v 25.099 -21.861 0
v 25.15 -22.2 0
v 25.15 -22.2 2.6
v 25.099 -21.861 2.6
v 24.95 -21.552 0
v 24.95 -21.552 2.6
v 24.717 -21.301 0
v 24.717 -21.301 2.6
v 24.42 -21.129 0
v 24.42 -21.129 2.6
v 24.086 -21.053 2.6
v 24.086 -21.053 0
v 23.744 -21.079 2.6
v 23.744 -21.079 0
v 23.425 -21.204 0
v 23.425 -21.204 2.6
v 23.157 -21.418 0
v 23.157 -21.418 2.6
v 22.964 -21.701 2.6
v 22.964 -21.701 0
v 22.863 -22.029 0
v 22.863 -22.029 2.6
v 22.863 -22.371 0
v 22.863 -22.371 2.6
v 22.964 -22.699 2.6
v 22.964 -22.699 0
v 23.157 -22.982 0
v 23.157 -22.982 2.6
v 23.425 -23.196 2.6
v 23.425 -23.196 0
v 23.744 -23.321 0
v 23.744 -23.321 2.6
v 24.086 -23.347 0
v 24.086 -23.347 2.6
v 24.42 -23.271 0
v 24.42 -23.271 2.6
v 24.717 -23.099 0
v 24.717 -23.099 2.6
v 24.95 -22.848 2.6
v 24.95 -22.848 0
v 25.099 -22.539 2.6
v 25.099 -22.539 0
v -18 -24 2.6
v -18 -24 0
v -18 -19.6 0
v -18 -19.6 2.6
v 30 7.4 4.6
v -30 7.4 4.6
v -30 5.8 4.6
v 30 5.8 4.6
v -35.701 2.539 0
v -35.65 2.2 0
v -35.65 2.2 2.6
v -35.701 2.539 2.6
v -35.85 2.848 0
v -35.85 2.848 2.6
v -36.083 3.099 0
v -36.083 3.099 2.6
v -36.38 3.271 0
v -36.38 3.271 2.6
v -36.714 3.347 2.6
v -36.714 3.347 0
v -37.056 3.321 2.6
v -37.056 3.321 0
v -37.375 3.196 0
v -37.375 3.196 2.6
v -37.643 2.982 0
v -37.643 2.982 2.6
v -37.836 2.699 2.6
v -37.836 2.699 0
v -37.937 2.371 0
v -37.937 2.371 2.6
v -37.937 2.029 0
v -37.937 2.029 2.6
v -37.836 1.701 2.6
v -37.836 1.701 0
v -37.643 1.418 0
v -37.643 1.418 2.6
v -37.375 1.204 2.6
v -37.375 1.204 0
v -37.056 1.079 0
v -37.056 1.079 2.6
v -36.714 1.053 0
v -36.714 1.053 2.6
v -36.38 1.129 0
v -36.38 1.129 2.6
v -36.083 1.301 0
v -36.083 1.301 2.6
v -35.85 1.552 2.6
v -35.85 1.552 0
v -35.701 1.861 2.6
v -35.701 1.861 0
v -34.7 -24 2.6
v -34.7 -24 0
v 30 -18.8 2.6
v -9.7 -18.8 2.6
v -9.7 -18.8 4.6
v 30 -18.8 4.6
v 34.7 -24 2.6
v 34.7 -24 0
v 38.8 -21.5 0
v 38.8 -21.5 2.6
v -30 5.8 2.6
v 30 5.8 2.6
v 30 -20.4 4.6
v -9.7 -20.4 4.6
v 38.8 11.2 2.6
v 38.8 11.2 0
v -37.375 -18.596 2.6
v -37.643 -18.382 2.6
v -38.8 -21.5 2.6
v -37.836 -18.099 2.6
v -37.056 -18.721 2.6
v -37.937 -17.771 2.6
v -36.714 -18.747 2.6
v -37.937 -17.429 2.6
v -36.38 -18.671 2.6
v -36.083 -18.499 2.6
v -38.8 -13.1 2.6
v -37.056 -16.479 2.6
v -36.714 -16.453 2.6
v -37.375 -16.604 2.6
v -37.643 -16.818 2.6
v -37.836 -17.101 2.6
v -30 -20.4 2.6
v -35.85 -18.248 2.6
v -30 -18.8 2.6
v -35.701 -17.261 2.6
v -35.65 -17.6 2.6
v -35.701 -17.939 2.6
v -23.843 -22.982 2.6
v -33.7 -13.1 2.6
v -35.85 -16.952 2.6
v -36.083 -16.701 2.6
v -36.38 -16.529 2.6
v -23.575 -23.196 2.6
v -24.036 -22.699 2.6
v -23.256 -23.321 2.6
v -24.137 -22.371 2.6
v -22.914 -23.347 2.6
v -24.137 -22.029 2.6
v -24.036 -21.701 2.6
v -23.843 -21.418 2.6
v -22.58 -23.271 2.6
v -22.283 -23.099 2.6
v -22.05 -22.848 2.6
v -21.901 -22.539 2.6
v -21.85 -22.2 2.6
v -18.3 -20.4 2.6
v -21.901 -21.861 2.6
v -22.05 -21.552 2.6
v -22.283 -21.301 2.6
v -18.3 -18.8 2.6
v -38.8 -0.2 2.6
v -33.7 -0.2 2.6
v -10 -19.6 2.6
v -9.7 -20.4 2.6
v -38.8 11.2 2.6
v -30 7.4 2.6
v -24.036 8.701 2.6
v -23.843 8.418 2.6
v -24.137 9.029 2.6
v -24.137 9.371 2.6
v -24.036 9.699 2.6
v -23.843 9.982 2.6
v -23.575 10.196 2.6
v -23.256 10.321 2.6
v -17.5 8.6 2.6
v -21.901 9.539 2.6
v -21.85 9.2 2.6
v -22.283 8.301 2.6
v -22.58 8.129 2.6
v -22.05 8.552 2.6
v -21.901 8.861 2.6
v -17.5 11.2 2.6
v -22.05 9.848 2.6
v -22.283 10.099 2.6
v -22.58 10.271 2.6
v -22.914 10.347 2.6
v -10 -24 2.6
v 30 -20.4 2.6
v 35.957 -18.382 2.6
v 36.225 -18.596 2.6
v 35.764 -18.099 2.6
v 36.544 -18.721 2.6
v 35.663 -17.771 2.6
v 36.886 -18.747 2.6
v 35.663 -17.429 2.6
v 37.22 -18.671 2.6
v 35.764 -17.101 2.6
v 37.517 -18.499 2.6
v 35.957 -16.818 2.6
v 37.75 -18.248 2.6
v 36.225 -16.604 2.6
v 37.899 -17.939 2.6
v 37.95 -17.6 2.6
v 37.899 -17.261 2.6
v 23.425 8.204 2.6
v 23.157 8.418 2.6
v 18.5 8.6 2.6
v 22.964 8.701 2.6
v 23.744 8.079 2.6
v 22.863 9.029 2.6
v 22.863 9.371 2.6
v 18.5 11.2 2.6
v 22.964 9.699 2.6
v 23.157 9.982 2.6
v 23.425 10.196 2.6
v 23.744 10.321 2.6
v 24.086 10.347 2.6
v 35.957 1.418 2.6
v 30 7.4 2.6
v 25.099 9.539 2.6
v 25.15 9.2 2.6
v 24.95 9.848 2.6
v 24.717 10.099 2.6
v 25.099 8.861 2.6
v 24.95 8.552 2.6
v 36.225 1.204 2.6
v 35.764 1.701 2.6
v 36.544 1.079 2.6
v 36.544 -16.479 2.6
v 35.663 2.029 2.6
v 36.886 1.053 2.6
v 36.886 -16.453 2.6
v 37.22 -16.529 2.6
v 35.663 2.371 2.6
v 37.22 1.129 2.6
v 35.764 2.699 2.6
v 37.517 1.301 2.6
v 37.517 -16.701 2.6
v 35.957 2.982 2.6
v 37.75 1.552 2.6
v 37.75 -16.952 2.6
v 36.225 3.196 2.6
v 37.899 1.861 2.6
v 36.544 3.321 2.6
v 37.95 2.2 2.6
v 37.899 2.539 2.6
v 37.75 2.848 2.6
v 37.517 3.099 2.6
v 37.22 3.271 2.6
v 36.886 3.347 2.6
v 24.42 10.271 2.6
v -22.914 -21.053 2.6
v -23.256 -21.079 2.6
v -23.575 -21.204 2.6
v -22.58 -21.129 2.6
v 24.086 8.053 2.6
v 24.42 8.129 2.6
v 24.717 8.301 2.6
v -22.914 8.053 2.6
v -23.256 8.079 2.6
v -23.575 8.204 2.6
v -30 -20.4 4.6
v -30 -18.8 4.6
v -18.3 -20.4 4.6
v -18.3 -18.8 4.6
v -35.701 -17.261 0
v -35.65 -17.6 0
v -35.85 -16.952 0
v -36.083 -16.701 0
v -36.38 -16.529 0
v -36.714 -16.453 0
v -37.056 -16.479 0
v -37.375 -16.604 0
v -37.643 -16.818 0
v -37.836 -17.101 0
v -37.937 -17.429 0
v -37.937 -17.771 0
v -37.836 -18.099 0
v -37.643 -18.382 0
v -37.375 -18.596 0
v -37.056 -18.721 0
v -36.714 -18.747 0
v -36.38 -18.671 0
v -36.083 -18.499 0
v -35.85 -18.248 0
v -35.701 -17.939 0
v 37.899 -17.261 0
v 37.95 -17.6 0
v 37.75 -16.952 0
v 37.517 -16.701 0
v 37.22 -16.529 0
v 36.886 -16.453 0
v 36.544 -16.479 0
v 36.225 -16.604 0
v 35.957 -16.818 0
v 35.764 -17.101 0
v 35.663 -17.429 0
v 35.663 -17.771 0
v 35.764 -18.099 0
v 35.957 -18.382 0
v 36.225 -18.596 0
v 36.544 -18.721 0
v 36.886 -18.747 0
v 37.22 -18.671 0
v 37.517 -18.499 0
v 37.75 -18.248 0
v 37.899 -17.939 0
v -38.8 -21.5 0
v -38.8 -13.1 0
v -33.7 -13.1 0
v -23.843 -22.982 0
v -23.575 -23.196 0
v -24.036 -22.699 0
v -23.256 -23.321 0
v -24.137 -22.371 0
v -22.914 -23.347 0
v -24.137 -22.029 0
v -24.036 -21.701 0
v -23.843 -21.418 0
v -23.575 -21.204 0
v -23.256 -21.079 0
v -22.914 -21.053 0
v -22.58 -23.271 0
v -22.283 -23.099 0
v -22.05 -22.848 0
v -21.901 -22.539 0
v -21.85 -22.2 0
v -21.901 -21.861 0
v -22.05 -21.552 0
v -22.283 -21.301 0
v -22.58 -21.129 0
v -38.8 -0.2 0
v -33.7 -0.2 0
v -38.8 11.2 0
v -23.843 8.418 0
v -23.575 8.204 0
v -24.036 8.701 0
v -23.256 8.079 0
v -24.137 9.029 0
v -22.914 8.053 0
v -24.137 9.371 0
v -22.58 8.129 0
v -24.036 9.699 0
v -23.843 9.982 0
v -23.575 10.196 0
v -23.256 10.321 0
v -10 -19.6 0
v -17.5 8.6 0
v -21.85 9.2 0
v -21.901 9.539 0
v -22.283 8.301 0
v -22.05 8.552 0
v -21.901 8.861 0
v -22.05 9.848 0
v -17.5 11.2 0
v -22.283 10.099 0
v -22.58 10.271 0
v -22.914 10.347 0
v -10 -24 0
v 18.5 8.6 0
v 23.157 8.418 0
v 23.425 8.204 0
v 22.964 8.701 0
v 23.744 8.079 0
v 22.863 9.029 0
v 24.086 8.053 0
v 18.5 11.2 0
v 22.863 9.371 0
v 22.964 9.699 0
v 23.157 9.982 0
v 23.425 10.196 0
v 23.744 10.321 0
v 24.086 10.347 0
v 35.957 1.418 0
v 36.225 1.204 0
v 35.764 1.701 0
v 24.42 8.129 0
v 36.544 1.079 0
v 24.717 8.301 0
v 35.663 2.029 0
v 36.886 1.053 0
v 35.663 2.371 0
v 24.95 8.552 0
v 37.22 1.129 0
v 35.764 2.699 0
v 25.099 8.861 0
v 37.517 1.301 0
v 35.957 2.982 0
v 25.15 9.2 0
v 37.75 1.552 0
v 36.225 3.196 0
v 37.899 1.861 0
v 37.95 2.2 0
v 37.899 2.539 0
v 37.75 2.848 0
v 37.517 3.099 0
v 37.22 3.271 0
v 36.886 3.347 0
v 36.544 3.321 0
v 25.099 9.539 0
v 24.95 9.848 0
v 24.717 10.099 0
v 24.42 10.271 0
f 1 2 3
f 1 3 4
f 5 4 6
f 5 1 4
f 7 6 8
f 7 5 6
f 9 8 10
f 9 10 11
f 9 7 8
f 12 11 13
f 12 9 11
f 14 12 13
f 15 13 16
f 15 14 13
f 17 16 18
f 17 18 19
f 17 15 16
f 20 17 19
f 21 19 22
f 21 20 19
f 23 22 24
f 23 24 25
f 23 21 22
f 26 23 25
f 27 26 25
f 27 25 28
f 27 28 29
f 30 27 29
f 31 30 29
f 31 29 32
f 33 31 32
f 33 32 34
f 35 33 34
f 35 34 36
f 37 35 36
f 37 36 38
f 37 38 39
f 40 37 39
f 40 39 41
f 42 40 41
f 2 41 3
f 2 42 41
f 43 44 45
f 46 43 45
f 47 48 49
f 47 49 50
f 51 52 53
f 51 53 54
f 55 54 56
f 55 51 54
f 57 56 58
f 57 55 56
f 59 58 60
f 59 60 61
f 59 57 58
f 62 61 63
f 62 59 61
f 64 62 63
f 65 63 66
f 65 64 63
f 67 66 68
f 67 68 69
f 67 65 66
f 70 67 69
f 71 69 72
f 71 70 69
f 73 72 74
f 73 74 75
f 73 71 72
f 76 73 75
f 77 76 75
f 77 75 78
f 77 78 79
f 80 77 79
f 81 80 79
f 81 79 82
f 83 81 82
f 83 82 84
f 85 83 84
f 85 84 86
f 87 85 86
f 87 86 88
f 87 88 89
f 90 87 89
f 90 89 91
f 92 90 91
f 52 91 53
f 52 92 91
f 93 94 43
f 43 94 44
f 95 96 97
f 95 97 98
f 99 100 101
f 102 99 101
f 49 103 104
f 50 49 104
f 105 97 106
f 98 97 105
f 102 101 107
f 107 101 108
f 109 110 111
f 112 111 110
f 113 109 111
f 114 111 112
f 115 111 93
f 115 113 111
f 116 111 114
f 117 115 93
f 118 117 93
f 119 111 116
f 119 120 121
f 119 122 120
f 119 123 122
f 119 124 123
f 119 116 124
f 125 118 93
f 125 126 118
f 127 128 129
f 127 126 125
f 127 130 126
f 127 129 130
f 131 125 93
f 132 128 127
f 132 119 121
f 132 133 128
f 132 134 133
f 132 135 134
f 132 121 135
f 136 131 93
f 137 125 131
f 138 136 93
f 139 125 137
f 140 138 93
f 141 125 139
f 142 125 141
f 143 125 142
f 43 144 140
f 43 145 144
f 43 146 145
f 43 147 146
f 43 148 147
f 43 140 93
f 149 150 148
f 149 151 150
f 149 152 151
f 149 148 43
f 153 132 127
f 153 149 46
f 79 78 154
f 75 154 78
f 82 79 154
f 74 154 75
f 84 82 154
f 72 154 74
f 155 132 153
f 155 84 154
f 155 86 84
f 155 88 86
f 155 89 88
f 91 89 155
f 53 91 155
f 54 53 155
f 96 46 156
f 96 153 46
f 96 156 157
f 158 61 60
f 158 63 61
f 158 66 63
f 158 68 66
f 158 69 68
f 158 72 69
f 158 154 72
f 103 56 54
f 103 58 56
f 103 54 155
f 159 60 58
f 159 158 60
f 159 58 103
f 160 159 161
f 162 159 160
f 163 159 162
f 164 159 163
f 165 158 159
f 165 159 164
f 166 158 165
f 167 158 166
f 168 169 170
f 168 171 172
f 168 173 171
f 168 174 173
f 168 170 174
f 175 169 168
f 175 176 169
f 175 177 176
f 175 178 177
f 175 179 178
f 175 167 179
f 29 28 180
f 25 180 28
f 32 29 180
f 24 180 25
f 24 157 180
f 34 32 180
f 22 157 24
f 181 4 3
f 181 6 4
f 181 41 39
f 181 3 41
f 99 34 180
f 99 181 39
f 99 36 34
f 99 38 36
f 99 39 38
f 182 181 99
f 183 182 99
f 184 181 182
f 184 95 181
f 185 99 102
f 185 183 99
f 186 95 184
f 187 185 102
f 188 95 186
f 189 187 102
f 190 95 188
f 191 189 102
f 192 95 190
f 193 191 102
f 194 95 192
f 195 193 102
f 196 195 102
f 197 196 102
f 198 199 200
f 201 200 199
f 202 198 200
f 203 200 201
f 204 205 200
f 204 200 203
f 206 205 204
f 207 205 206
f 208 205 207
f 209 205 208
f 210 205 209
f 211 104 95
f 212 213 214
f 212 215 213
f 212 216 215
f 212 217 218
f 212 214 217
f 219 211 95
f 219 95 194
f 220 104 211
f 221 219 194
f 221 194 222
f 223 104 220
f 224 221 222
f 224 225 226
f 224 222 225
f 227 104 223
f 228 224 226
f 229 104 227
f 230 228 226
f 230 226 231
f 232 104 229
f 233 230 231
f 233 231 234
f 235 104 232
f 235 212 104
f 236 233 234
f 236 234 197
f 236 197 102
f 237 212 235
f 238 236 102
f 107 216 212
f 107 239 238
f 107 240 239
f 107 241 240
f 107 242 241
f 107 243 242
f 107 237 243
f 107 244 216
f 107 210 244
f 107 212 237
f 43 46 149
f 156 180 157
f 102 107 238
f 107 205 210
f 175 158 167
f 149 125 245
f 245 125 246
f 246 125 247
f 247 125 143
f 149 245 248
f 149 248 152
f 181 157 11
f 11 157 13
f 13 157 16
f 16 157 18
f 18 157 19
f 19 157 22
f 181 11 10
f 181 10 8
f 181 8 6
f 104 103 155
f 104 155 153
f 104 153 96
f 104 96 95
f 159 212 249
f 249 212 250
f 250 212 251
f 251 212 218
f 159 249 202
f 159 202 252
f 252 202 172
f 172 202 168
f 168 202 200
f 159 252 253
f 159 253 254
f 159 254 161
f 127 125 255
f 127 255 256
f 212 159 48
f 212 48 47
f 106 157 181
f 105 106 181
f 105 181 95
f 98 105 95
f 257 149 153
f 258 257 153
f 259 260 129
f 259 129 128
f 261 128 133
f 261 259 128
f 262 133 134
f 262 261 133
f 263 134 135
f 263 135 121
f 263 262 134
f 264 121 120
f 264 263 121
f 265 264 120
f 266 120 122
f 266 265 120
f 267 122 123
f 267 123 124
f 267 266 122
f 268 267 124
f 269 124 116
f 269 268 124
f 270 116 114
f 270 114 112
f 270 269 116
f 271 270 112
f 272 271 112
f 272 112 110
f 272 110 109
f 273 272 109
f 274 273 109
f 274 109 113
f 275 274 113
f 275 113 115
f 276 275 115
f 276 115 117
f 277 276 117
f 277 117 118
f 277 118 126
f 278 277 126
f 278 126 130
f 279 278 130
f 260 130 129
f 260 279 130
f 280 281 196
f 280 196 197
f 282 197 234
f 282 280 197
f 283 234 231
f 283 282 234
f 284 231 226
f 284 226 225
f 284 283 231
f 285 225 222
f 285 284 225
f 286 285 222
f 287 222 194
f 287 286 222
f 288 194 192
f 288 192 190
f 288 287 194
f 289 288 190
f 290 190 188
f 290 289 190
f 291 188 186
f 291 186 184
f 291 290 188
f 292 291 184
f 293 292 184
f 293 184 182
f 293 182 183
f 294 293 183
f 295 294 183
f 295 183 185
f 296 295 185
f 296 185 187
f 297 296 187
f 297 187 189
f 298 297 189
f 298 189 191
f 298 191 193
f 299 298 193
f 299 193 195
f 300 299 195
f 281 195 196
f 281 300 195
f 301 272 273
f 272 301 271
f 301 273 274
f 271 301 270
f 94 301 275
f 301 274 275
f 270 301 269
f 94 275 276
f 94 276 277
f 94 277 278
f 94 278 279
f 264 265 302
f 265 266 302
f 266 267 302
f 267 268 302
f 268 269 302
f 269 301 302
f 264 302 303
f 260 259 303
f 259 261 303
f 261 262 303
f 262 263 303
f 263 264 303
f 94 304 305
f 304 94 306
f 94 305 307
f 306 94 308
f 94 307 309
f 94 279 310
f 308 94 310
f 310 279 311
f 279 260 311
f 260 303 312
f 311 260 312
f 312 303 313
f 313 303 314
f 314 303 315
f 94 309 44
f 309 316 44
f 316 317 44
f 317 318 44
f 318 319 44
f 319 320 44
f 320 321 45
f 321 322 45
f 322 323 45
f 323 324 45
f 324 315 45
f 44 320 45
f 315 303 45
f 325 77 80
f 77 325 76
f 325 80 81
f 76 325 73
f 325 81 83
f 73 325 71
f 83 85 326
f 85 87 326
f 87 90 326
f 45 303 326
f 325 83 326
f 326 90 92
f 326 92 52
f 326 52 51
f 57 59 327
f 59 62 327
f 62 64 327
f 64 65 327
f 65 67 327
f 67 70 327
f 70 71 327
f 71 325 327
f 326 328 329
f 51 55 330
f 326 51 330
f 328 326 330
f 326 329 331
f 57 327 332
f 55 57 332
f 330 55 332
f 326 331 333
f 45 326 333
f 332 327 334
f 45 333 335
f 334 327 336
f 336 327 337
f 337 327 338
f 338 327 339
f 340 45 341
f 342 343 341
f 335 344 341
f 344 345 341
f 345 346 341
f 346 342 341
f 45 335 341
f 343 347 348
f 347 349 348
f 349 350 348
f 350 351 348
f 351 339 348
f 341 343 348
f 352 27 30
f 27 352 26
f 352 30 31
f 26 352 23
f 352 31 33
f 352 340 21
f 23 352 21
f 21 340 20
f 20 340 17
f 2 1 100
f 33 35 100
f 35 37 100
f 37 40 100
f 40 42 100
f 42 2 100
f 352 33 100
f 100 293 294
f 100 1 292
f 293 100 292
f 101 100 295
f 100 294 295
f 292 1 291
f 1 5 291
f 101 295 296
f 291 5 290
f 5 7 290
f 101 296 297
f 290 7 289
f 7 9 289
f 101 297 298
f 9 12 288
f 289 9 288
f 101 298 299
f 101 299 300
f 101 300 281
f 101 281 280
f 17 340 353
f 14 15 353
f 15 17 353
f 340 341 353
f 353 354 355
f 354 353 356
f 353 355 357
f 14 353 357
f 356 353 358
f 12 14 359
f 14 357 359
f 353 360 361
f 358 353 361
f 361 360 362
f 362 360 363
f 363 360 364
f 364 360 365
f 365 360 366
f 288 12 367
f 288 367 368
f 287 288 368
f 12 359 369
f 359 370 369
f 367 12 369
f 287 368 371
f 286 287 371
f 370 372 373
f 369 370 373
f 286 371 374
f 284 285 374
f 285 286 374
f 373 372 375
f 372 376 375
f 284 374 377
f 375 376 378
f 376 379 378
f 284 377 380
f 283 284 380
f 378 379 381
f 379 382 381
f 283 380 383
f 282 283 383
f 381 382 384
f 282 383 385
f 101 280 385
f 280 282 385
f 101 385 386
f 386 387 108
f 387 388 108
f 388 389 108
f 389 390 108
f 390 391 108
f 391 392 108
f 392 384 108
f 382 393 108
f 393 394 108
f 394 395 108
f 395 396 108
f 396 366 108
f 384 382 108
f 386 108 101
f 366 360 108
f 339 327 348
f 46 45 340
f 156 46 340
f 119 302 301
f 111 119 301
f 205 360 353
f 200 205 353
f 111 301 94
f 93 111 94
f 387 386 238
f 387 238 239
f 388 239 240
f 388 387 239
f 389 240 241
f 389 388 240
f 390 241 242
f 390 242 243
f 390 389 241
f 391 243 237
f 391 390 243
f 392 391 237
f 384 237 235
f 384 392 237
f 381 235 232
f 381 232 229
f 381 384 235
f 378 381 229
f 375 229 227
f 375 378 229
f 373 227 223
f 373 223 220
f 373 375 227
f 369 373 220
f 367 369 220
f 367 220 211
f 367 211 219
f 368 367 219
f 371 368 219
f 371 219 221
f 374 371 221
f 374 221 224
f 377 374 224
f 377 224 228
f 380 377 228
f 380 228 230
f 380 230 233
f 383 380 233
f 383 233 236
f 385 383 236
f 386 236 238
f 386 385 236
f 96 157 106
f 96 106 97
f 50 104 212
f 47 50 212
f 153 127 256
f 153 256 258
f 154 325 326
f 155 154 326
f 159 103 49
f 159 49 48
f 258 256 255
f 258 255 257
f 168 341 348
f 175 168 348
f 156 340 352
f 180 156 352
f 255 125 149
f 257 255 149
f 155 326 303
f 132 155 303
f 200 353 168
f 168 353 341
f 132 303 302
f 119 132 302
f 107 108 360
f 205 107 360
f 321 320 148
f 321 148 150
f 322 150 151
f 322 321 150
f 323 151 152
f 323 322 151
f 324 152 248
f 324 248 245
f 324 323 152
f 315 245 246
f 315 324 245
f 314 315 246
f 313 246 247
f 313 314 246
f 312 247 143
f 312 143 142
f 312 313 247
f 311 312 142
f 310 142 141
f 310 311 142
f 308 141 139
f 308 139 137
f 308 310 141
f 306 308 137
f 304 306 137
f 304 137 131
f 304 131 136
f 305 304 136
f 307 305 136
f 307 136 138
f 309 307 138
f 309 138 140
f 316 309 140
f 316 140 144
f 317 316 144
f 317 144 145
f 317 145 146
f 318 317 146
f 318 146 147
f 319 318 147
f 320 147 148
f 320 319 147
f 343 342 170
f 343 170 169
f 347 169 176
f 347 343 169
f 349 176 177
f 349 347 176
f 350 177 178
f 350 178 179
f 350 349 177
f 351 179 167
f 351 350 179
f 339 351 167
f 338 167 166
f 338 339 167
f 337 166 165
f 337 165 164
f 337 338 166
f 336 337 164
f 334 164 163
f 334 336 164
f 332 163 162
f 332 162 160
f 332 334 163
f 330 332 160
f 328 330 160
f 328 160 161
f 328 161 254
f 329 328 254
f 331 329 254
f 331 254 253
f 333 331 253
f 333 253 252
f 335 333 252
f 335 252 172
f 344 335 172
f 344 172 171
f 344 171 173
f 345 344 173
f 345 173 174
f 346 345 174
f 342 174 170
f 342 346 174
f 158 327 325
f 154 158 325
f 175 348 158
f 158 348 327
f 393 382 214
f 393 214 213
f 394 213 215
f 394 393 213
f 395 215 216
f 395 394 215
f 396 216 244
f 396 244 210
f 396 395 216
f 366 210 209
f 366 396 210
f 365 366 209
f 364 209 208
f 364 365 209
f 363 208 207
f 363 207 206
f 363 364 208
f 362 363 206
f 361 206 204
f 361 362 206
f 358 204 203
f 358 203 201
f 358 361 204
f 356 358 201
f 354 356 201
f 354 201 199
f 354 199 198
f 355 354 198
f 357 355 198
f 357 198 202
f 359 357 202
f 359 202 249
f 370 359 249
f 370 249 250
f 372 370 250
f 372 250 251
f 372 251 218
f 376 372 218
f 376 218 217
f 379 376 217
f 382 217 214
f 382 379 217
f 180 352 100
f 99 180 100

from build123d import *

# Parameters (mm, degrees)
TRIMMED_UPPER_SHELF_CABLE_NOTCH_AN_2_R       = 1.15
TRIMMED_UPPER_SHELF_CABLE_NOTCH_AND_AN_DEPTH = 2.6
PCB_START                                    = 2.6
PCB_EDGE_RESTS_WITH_ANTENNA_GAP_PROFILE_W    = 11.7
PCB_EDGE_RESTS_WITH_ANTENNA_GAP_PROFILE_H    = 1.6
PCB_EDGE_RESTS_WITH_ANTENNA_GAP_PROFILE_W_2  = 39.7
PCB_EDGE_RESTS_WITH_ANTENNA_GAP_PROFILE_W_3  = 60
PCB_EDGE_RESTS_WITH_ANTENNA_GAP_DEPTH        = 2


with BuildPart() as part:
    # Trimmed upper shelf - cable notch an 2 → Trimmed upper shelf - cable notch and an (new body)
    with BuildSketch(Plane.XY):
        Polygon((-38.8, -21.5), (-34.7, -24), (-18, -24), (-18, -19.6), (-10, -19.6), (-10, -24), (34.7, -24), (38.8, -21.5), (38.8, 11.2), (18.5, 11.2), (18.5, 8.6), (-17.5, 8.6), (-17.5, 11.2), (-38.8, 11.2), (-38.8, -0.2), (-33.7, -0.2), (-33.7, -13.1), (-38.8, -13.1), align=None)
        with Locations((-36.8, -17.6)):
            Circle(TRIMMED_UPPER_SHELF_CABLE_NOTCH_AN_2_R, mode=Mode.SUBTRACT)
        with Locations((36.8, -17.6)):
            Circle(TRIMMED_UPPER_SHELF_CABLE_NOTCH_AN_2_R, mode=Mode.SUBTRACT)
        with Locations((-36.8, 2.2)):
            Circle(TRIMMED_UPPER_SHELF_CABLE_NOTCH_AN_2_R, mode=Mode.SUBTRACT)
        with Locations((36.8, 2.2)):
            Circle(TRIMMED_UPPER_SHELF_CABLE_NOTCH_AN_2_R, mode=Mode.SUBTRACT)
        with Locations((-23, -22.2)):
            Circle(TRIMMED_UPPER_SHELF_CABLE_NOTCH_AN_2_R, mode=Mode.SUBTRACT)
        with Locations((24, -22.2)):
            Circle(TRIMMED_UPPER_SHELF_CABLE_NOTCH_AN_2_R, mode=Mode.SUBTRACT)
        with Locations((-23, 9.2)):
            Circle(TRIMMED_UPPER_SHELF_CABLE_NOTCH_AN_2_R, mode=Mode.SUBTRACT)
        with Locations((24, 9.2)):
            Circle(TRIMMED_UPPER_SHELF_CABLE_NOTCH_AN_2_R, mode=Mode.SUBTRACT)
    extrude(amount=TRIMMED_UPPER_SHELF_CABLE_NOTCH_AND_AN_DEPTH)

    # PCB edge rests with antenna gap profile → PCB edge rests with antenna gap (add)
    with BuildSketch(Plane.XY.offset(PCB_START)):
        with Locations((-24.15, -19.6)):
            Rectangle(PCB_EDGE_RESTS_WITH_ANTENNA_GAP_PROFILE_W, PCB_EDGE_RESTS_WITH_ANTENNA_GAP_PROFILE_H)
        with Locations((10.15, -19.6)):
            Rectangle(PCB_EDGE_RESTS_WITH_ANTENNA_GAP_PROFILE_W_2, PCB_EDGE_RESTS_WITH_ANTENNA_GAP_PROFILE_H)
        with Locations((0, 6.6)):
            Rectangle(PCB_EDGE_RESTS_WITH_ANTENNA_GAP_PROFILE_W_3, PCB_EDGE_RESTS_WITH_ANTENNA_GAP_PROFILE_H)
    extrude(amount=PCB_EDGE_RESTS_WITH_ANTENNA_GAP_DEPTH)


solid = part.part
